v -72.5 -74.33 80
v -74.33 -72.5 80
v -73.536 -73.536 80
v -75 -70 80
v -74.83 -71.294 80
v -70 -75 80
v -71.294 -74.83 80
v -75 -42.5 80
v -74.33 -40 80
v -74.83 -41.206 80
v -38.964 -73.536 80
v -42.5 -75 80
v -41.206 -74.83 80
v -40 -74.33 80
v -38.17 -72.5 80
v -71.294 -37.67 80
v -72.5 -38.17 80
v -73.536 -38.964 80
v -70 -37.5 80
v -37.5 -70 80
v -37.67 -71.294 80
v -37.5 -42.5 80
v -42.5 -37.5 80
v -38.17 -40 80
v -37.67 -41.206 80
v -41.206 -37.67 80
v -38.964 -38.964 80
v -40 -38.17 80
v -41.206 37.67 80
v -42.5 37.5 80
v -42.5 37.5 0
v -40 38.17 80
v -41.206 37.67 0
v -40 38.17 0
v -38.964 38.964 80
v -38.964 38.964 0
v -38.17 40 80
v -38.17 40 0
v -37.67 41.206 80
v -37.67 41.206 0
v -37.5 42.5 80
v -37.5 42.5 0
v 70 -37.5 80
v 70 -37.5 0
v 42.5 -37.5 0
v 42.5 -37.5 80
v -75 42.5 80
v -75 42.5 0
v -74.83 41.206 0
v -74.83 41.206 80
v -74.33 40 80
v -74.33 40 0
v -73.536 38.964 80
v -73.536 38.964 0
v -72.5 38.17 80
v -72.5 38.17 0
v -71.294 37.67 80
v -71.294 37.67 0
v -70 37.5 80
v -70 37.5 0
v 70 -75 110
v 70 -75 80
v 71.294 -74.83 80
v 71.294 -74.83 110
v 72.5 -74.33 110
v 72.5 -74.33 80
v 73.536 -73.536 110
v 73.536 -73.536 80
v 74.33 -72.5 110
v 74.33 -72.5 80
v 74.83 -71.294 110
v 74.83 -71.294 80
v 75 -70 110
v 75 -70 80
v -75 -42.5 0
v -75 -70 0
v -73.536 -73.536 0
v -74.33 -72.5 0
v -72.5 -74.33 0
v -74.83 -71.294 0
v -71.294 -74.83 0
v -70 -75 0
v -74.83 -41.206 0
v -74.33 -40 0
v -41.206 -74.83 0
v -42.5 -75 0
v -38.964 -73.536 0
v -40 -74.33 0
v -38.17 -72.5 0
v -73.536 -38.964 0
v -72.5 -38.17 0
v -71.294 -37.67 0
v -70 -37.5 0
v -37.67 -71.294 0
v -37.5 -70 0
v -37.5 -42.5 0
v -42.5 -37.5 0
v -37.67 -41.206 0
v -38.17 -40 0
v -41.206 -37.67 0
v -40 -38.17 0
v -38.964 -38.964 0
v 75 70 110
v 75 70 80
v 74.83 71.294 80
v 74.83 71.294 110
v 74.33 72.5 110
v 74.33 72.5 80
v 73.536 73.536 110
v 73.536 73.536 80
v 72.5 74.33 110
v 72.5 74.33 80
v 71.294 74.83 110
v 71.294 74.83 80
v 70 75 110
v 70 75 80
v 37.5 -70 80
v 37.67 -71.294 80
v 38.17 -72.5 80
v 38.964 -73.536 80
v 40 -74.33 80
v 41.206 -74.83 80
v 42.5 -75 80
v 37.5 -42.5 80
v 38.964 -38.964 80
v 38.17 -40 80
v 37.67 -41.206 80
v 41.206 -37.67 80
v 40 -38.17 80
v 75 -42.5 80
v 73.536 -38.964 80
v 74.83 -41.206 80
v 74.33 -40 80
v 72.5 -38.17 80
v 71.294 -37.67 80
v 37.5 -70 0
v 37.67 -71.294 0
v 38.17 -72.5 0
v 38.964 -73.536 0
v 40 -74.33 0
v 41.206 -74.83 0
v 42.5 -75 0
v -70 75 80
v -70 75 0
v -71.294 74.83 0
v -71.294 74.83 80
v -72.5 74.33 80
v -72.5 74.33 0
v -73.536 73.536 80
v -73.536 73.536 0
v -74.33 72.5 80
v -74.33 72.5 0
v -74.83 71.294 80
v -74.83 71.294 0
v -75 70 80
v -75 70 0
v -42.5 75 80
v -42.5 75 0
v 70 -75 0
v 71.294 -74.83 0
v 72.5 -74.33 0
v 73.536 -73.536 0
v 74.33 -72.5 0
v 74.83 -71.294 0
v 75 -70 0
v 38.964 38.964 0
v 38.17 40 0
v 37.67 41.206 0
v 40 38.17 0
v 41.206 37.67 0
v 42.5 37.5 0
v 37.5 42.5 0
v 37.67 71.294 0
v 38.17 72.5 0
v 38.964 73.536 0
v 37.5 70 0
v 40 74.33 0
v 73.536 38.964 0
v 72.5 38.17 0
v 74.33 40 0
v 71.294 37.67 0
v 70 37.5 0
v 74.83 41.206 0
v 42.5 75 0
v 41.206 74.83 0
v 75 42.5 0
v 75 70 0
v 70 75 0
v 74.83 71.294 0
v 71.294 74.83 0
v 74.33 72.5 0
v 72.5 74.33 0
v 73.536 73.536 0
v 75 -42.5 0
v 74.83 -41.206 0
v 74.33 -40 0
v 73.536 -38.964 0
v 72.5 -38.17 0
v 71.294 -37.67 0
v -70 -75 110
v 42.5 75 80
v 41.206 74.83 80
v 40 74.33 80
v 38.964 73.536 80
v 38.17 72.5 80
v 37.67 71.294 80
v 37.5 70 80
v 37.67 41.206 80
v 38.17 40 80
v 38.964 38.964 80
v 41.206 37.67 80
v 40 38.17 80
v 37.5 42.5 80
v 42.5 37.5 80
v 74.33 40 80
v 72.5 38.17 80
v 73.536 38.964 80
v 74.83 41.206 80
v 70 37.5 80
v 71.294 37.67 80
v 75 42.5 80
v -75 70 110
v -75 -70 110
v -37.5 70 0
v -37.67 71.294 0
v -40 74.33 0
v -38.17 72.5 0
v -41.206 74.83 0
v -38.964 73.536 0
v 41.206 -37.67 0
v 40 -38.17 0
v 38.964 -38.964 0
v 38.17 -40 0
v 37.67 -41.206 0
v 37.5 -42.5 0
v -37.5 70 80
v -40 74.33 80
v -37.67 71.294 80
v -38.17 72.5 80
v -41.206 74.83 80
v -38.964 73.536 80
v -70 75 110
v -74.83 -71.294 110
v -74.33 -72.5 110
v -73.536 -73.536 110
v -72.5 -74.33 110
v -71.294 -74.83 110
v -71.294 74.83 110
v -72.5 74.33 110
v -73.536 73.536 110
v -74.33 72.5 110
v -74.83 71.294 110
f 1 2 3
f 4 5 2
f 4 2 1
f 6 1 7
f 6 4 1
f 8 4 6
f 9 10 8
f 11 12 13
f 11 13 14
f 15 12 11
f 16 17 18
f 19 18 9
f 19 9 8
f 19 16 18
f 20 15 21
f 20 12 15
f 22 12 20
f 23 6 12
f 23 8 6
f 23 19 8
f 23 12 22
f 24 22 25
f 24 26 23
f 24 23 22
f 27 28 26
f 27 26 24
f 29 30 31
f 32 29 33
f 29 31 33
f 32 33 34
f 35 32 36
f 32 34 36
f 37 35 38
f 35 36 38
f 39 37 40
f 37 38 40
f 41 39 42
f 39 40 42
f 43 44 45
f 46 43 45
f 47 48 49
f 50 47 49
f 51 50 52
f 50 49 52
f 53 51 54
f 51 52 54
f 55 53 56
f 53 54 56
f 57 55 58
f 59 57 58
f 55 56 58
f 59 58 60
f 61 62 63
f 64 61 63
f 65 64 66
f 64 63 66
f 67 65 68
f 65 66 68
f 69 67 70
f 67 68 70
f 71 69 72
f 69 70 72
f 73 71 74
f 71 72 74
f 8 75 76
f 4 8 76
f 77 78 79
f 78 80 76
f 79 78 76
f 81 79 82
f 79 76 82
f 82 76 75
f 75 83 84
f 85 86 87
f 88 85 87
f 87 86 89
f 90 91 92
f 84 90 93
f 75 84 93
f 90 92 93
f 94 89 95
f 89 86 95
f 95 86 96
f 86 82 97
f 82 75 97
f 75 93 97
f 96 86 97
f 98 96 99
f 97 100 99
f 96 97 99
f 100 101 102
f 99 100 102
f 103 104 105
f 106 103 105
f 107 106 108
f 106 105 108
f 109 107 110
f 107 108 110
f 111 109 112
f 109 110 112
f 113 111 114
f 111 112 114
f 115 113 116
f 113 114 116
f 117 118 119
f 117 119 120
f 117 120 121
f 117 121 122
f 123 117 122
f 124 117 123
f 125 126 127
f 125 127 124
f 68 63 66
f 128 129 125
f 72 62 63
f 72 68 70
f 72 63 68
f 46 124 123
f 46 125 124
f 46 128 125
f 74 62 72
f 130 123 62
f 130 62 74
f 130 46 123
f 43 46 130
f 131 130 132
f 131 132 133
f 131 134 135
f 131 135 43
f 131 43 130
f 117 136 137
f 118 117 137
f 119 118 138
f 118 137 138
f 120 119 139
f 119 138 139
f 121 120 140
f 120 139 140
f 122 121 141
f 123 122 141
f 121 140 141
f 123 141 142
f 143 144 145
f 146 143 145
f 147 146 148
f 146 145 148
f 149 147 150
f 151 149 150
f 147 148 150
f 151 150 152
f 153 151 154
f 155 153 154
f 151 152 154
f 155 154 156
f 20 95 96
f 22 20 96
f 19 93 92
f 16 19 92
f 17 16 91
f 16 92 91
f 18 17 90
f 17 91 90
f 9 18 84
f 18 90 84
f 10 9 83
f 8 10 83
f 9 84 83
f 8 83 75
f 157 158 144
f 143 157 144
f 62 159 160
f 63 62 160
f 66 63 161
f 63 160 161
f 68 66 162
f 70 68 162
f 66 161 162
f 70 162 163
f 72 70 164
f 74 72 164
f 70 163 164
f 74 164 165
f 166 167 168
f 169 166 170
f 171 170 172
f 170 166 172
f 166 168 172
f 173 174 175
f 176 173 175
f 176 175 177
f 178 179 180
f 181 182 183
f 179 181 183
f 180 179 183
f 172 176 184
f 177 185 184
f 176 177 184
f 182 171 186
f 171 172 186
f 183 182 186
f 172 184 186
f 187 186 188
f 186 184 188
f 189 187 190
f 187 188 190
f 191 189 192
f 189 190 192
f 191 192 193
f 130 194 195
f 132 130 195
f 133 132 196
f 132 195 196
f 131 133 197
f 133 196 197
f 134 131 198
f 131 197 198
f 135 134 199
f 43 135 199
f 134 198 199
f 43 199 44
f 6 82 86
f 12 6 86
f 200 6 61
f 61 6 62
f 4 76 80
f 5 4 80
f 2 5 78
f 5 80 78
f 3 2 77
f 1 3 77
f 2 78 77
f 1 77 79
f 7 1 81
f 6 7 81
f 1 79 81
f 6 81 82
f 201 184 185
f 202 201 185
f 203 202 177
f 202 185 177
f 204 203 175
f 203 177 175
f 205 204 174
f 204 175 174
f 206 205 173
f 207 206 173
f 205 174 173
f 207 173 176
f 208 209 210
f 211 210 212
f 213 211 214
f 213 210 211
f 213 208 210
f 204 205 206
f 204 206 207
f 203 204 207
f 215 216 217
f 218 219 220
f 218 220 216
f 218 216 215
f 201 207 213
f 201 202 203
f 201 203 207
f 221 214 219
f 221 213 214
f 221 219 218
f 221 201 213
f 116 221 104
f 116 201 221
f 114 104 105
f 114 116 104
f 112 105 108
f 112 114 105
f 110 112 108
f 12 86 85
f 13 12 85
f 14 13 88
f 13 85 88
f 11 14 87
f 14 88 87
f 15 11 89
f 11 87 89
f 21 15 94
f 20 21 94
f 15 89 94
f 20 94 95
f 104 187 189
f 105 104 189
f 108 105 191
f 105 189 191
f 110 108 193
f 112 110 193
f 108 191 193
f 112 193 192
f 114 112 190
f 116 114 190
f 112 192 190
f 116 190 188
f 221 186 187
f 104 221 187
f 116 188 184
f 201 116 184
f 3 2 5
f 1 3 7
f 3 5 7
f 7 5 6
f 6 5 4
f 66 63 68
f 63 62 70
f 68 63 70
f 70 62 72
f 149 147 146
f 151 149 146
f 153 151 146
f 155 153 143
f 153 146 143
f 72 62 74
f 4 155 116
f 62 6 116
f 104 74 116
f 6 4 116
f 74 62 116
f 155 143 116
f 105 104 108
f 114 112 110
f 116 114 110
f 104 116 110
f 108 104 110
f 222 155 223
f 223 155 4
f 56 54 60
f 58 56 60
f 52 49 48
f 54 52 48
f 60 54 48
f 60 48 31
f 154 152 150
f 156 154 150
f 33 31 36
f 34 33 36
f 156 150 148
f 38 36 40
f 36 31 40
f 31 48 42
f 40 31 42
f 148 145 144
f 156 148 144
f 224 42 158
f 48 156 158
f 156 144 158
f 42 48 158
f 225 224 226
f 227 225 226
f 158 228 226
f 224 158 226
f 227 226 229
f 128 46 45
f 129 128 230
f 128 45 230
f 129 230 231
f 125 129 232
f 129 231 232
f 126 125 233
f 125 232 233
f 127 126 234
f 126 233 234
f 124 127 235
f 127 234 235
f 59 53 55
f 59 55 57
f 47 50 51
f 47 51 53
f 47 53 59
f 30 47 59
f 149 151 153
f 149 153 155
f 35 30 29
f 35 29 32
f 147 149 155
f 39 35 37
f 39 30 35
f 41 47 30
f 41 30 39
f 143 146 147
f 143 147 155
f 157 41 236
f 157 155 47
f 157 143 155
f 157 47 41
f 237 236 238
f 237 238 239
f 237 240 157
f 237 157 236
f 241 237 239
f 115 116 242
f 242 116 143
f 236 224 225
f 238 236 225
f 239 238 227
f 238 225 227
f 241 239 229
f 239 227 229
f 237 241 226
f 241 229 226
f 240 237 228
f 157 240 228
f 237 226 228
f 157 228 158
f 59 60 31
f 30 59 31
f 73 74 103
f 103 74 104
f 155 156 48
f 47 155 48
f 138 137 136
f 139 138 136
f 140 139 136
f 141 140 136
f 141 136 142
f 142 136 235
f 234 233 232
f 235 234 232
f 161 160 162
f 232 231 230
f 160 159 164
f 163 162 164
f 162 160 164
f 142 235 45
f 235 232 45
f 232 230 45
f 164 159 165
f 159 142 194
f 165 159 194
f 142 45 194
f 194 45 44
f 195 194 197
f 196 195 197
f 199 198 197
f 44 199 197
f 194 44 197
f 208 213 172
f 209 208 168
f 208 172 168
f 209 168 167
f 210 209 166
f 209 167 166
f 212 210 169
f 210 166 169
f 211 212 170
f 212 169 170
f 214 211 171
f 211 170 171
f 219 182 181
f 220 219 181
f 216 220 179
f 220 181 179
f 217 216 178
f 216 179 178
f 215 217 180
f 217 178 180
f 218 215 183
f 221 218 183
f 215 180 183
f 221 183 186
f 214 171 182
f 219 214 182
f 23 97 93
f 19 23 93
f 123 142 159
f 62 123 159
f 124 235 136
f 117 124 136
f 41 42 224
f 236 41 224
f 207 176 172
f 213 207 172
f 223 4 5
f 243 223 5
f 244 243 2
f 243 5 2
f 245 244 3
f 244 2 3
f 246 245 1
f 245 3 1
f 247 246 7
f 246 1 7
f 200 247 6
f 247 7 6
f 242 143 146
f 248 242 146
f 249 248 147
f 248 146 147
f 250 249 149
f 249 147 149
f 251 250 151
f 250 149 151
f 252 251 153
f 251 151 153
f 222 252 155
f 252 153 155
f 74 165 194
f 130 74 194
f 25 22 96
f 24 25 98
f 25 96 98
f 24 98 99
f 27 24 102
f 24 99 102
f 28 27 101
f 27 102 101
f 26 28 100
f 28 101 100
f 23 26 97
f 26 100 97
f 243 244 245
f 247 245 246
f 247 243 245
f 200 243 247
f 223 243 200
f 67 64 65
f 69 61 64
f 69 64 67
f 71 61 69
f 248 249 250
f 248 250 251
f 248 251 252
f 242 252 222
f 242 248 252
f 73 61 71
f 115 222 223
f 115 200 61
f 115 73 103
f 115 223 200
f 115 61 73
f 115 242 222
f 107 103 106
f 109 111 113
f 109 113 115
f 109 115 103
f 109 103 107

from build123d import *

# Parameters (mm, degrees)
F1_DEPTH = 80
F3_DEPTH = 30


with BuildPart() as f1:
    # F0 (on Top) → F1 (new body)
    with BuildSketch(Plane.XY):
        with BuildLine():
            Line((37.5, 70), (37.5, 42.5))
            ThreePointArc((37.5, 42.5), (38.964466, 38.964466), (42.5, 37.5))
            Line((42.5, 37.5), (70, 37.5))
            ThreePointArc((70, 37.5), (73.535534, 38.964466), (75, 42.5))
            Line((75, 42.5), (75, 70))
            ThreePointArc((75, 70), (73.535534, 73.535534), (70, 75))
            Line((70, 75), (42.5, 75))
            ThreePointArc((42.5, 75), (38.964466, 73.535534), (37.5, 70))
        make_face()
        with BuildLine():
            Line((-70, 37.5), (-42.5, 37.5))
            ThreePointArc((-42.5, 37.5), (-38.964466, 38.964466), (-37.5, 42.5))
            Line((-37.5, 42.5), (-37.5, 70))
            ThreePointArc((-37.5, 70), (-38.964466, 73.535534), (-42.5, 75))
            Line((-42.5, 75), (-70, 75))
            ThreePointArc((-70, 75), (-73.535534, 73.535534), (-75, 70))
            Line((-75, 70), (-75, 42.5))
            ThreePointArc((-75, 42.5), (-73.535534, 38.964466), (-70, 37.5))
        make_face()
        with BuildLine():
            ThreePointArc((-37.5, -42.5), (-38.964466, -38.964466), (-42.5, -37.5))
            Line((-42.5, -37.5), (-70, -37.5))
            ThreePointArc((-70, -37.5), (-73.535534, -38.964466), (-75, -42.5))
            Line((-75, -42.5), (-75, -70))
            ThreePointArc((-75, -70), (-73.535534, -73.535534), (-70, -75))
            Line((-70, -75), (-42.5, -75))
            ThreePointArc((-42.5, -75), (-38.964466, -73.535534), (-37.5, -70))
            Line((-37.5, -70), (-37.5, -42.5))
        make_face()
        with BuildLine():
            Line((-48.75, -66.25), (-56.25, -66.25))
            Line((-56.25, -66.25), (-63.75, -66.25))
            ThreePointArc((-63.75, -66.25), (-67.285534, -64.785534), (-68.75, -61.25))
            Line((-68.75, -61.25), (-68.75, -51.25))
            ThreePointArc((-68.75, -51.25), (-67.285534, -47.714466), (-63.75, -46.25))
            Line((-63.75, -46.25), (-48.75, -46.25))
            ThreePointArc((-48.75, -46.25), (-45.214466, -47.714466), (-43.75, -51.25))
            Line((-43.75, -51.25), (-43.75, -61.25))
            ThreePointArc((-43.75, -61.25), (-45.214466, -64.785534), (-48.75, -66.25))
        make_face(mode=Mode.SUBTRACT)
        with BuildLine():
            Line((-63.75, -66.25), (-56.25, -66.25))
            Line((-56.25, -66.25), (-48.75, -66.25))
            ThreePointArc((-48.75, -66.25), (-45.214466, -64.785534), (-43.75, -61.25))
            Line((-43.75, -61.25), (-43.75, -51.25))
            ThreePointArc((-43.75, -51.25), (-45.214466, -47.714466), (-48.75, -46.25))
            Line((-48.75, -46.25), (-63.75, -46.25))
            ThreePointArc((-63.75, -46.25), (-67.285534, -47.714466), (-68.75, -51.25))
            Line((-68.75, -51.25), (-68.75, -61.25))
            ThreePointArc((-68.75, -61.25), (-67.285534, -64.785534), (-63.75, -66.25))
        make_face()
        with BuildLine():
            Line((70, -37.5), (42.5, -37.5))
            ThreePointArc((42.5, -37.5), (38.964466, -38.964466), (37.5, -42.5))
            Line((37.5, -42.5), (37.5, -70))
            ThreePointArc((37.5, -70), (38.964466, -73.535534), (42.5, -75))
            Line((42.5, -75), (70, -75))
            ThreePointArc((70, -75), (73.535534, -73.535534), (75, -70))
            Line((75, -70), (75, -42.5))
            ThreePointArc((75, -42.5), (73.535534, -38.964466), (70, -37.5))
        make_face()
    extrude(amount=F1_DEPTH)


with BuildPart() as f3:
    # F2 (on face) → F3 (new body)
    with BuildSketch(Plane.XY.offset(80)):
        with BuildLine():
            Line((70, 75), (-42.5, 75))
            ThreePointArc((-42.5, 75), (-38.964466, 73.535534), (-37.5, 70))
            Line((-37.5, 70), (-37.5, 42.5))
            ThreePointArc((-37.5, 42.5), (-38.964466, 38.964466), (-42.5, 37.5))
            Line((-42.5, 37.5), (-70, 37.5))
            ThreePointArc((-70, 37.5), (-73.535534, 38.964466), (-75, 42.5))
            Line((-75, 42.5), (-75, -70))
            ThreePointArc((-75, -70), (-73.535534, -73.535534), (-70, -75))
            Line((-70, -75), (70, -75))
            ThreePointArc((70, -75), (73.535534, -73.535534), (75, -70))
            Line((75, -70), (75, 70))
            ThreePointArc((75, 70), (73.535534, 73.535534), (70, 75))
        make_face()
        with BuildLine():
            Line((-42.5, 75), (-70, 75))
            ThreePointArc((-70, 75), (-73.535534, 73.535534), (-75, 70))
            Line((-75, 70), (-75, 42.5))
            ThreePointArc((-75, 42.5), (-73.535534, 38.964466), (-70, 37.5))
            Line((-70, 37.5), (-42.5, 37.5))
            ThreePointArc((-42.5, 37.5), (-38.964466, 38.964466), (-37.5, 42.5))
            Line((-37.5, 42.5), (-37.5, 70))
            ThreePointArc((-37.5, 70), (-38.964466, 73.535534), (-42.5, 75))
        make_face()
    extrude(amount=F3_DEPTH)


solid = Compound([f1.part, f3.part])
